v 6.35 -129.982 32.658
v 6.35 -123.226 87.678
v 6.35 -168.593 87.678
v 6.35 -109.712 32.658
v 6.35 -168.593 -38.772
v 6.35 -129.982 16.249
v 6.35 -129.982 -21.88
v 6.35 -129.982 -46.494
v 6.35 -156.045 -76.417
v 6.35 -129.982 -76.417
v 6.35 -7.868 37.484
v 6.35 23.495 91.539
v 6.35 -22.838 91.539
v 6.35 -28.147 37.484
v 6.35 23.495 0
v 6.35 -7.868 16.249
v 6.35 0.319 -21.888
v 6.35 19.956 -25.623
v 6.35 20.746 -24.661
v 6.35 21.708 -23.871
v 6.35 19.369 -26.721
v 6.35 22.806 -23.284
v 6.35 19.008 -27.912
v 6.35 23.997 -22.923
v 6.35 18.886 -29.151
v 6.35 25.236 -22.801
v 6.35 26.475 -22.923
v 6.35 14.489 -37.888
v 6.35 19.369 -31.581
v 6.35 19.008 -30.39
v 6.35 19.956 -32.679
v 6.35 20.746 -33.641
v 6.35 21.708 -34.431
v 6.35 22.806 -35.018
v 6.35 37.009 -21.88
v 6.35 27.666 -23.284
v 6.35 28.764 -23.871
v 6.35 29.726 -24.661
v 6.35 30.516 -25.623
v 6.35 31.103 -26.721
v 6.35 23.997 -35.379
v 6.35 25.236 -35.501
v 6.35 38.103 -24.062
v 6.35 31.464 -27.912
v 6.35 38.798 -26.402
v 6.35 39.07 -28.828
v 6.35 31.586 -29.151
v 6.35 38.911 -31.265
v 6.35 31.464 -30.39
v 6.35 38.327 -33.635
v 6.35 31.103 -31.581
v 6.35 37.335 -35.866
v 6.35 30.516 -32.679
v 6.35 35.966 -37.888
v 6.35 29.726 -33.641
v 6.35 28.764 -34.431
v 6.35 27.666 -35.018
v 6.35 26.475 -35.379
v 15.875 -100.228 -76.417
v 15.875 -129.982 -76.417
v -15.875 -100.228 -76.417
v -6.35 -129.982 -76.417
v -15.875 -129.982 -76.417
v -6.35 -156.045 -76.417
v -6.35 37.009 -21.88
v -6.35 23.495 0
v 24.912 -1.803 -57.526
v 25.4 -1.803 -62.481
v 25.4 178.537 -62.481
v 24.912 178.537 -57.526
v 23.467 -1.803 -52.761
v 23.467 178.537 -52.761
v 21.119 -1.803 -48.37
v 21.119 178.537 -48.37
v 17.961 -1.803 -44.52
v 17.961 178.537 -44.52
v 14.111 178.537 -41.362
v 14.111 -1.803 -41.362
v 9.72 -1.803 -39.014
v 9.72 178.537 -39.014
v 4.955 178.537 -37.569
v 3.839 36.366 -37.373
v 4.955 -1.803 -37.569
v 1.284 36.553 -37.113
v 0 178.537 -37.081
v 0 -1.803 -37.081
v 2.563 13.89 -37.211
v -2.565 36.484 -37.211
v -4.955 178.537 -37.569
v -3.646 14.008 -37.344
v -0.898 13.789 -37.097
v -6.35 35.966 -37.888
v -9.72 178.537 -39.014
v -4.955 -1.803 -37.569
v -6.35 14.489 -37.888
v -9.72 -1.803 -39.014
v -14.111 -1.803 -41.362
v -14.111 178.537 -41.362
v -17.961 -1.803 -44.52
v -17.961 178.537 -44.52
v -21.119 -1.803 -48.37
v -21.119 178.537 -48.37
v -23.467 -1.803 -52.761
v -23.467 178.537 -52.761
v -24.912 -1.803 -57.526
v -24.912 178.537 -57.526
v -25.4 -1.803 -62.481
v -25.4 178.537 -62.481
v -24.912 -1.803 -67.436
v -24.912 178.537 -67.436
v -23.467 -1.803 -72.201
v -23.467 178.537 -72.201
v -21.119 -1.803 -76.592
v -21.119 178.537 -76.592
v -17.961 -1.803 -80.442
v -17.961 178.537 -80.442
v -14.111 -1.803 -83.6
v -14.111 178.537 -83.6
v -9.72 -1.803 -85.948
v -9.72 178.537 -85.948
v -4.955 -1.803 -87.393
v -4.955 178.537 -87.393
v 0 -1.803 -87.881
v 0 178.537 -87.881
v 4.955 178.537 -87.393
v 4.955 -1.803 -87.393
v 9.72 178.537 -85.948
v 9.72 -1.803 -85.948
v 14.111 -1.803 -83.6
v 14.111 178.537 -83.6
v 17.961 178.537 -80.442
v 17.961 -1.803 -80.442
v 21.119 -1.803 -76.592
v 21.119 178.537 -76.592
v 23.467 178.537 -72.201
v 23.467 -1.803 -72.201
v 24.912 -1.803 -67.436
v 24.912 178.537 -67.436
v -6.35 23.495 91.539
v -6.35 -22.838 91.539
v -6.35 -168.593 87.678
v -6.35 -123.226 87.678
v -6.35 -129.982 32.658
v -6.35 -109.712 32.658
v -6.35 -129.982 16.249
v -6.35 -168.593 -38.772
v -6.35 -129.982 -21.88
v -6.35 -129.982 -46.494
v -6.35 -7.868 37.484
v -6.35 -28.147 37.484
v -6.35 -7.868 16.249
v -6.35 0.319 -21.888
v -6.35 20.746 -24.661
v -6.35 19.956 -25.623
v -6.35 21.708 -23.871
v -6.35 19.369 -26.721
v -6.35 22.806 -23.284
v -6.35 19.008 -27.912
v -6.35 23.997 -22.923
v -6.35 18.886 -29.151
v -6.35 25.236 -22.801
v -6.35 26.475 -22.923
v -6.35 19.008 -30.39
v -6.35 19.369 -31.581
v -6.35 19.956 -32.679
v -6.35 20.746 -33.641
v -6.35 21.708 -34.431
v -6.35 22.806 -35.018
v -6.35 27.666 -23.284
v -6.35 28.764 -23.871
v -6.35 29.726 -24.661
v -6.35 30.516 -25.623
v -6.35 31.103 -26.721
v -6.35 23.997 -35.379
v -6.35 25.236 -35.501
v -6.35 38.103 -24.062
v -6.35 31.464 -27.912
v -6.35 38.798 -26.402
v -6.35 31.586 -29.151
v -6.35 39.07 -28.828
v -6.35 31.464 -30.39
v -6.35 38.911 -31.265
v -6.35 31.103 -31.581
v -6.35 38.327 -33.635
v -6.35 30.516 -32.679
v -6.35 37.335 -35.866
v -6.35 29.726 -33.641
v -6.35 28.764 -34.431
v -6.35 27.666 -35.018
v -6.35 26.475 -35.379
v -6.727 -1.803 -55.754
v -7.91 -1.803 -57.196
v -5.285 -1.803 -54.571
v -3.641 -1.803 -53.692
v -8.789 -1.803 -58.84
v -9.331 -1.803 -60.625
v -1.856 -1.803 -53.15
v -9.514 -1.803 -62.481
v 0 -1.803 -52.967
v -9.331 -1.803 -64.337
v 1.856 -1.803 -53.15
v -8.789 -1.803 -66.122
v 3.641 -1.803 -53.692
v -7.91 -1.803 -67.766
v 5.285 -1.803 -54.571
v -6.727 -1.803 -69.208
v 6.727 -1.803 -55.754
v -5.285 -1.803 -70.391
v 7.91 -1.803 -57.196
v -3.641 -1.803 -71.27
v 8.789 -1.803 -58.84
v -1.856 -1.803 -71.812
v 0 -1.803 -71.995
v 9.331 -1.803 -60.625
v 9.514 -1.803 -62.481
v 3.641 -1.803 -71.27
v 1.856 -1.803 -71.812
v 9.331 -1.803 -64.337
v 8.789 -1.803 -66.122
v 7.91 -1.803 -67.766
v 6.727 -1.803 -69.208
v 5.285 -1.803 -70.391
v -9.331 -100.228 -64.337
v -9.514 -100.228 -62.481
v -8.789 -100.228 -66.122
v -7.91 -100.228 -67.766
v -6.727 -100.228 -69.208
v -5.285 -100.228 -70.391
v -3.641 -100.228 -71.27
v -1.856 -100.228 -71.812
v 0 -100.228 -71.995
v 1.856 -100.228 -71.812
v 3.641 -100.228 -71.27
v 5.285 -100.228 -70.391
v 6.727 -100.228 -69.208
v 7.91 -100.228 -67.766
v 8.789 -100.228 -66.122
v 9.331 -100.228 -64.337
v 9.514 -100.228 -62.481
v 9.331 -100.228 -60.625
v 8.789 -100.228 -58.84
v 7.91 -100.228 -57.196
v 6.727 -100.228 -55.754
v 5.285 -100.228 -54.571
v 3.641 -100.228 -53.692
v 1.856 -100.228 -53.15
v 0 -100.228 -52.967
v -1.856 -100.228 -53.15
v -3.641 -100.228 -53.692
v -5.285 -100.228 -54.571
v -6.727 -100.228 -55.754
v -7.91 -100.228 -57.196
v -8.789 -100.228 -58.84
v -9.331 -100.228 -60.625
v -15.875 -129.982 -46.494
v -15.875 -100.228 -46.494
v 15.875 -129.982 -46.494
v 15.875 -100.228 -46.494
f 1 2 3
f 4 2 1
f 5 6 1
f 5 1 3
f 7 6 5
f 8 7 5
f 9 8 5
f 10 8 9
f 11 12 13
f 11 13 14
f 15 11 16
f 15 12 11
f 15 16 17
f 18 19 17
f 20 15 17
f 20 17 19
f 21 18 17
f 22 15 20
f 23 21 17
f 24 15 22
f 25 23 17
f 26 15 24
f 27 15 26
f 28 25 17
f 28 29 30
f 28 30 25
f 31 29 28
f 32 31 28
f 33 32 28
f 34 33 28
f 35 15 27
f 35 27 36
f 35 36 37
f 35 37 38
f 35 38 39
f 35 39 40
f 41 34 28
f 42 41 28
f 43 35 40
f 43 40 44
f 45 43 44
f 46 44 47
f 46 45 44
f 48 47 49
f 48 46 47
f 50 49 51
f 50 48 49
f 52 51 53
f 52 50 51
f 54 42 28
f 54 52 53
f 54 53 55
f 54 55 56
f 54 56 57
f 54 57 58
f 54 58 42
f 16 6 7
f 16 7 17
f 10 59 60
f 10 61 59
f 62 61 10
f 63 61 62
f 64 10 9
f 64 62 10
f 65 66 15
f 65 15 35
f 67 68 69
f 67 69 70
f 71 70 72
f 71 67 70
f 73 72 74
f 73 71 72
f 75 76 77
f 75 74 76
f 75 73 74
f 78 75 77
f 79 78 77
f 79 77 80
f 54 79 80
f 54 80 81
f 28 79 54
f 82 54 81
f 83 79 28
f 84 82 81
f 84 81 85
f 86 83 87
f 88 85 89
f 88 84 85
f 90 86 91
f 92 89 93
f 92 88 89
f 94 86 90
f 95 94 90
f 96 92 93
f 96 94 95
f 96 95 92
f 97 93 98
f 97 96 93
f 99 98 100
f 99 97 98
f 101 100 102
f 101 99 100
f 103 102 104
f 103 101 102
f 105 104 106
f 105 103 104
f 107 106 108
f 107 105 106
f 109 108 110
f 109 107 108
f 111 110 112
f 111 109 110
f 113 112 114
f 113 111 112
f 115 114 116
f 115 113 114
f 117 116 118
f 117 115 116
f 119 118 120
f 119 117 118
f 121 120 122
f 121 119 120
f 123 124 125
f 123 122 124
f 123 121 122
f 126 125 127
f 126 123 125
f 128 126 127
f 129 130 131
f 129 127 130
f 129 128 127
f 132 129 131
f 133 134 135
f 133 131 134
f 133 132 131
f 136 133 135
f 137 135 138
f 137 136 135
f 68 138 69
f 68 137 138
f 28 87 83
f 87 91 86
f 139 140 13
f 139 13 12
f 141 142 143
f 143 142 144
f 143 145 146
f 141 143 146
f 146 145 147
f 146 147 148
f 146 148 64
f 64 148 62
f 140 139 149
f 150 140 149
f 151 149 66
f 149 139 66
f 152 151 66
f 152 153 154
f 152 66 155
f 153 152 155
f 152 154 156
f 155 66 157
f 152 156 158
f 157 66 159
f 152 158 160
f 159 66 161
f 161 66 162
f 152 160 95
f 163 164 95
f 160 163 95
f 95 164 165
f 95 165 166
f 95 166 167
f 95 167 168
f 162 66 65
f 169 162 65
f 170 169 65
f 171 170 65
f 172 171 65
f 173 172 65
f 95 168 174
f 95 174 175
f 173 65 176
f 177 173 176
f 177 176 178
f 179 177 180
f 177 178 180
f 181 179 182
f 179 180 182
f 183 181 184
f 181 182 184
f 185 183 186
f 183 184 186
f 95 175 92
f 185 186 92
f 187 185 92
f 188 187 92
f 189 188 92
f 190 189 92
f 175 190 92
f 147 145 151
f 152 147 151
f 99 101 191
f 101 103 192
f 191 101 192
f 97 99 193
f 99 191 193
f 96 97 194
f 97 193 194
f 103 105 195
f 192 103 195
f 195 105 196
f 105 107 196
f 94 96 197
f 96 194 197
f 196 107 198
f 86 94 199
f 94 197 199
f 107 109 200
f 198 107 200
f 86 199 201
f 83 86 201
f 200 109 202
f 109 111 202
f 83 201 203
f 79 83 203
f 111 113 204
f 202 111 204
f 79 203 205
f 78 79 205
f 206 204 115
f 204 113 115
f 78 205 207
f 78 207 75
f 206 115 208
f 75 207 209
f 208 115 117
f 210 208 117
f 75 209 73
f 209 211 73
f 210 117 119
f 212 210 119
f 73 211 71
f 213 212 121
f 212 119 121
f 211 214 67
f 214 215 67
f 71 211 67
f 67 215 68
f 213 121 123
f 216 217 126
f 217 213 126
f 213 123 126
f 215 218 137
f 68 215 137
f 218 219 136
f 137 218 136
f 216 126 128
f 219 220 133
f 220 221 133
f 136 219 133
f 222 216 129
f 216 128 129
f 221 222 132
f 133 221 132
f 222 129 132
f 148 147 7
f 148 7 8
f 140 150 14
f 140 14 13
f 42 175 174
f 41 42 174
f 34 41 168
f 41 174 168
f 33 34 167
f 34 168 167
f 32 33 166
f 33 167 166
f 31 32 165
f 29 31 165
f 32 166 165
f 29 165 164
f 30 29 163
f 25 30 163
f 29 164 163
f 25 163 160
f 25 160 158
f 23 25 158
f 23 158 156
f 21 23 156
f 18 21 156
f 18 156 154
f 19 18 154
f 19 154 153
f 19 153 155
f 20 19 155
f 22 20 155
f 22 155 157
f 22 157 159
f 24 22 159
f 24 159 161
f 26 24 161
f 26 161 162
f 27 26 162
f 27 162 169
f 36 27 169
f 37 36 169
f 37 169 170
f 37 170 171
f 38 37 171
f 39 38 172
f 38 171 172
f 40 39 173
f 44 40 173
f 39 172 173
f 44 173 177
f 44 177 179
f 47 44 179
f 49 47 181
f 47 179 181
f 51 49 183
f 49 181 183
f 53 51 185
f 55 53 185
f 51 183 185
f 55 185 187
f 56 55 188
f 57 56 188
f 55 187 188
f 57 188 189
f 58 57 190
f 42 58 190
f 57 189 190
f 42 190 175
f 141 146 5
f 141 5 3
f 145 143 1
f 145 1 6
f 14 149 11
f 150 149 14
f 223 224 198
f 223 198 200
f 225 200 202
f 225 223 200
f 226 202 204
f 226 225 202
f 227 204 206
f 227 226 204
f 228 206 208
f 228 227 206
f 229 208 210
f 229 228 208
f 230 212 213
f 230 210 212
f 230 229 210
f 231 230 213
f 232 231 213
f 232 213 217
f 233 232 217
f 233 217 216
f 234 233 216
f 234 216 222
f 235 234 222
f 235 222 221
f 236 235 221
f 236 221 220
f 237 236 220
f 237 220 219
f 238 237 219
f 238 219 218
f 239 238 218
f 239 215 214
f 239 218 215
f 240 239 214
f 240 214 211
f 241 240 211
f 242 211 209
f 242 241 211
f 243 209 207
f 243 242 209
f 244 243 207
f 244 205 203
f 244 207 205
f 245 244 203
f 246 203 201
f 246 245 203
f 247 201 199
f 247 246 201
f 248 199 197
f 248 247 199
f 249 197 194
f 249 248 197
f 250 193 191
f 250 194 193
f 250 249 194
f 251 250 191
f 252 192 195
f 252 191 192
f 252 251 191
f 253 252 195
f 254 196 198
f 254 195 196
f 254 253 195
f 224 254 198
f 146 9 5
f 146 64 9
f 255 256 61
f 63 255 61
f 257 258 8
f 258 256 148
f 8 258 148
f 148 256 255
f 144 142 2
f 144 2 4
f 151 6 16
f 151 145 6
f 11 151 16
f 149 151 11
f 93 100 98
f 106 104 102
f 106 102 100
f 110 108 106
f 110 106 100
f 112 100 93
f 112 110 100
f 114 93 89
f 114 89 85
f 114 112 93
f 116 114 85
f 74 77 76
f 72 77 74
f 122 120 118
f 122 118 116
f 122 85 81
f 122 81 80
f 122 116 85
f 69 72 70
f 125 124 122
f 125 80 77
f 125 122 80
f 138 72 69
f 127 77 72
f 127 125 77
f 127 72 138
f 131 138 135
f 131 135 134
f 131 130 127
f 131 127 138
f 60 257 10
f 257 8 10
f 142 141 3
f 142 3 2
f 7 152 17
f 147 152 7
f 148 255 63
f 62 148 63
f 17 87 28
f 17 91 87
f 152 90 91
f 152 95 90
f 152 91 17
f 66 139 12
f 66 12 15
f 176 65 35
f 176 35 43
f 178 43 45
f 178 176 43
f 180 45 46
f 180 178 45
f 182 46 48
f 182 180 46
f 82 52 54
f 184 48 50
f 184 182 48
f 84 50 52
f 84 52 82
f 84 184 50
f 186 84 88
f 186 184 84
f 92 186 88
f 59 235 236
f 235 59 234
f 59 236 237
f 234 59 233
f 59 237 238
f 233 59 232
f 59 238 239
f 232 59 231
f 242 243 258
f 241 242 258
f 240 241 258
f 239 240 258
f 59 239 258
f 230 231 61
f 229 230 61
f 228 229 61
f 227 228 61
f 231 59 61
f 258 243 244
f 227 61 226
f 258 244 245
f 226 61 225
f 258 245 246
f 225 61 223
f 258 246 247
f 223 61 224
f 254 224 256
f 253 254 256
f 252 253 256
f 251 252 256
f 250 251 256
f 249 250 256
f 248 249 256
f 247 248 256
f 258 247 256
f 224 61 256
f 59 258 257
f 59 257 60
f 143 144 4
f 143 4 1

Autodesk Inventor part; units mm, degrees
ref_plane "YZ Plane" through (0, 0, 0) normal (1, 0, 0) x (0, 1, 0)
ref_plane "XZ Plane" through (0, 0, 0) normal (0, 1, 0) x (-1, 0, 0)
ref_plane "XY Plane" through (0, 0, 0) normal (0, 0, 1) x (1, 0, 0)
sketch "Sketch1" plane through (0, 0, 0) normal (1, 0, 0) x (0, 0, -1)
  line L0 (76.417, -156.0446) -> (38.7716, -168.593)
  line L1 (38.7716, -168.593) -> (-87.6783, -168.593)
  line L2 (-87.6783, -168.593) -> (-87.6783, -123.2255)
  line L3 (-87.6783, -123.2255) -> (-32.6581, -109.7118)
  line L4 (-32.6581, -109.7118) -> (-32.6581, -129.9824)
  line L5 (-32.6581, -129.9824) -> (76.417, -129.9824)
  line L6 (76.417, -129.9824) -> (76.417, -156.0446)
  line L7 (-16.2486, -129.9824) -> (-16.2486, -7.8675)
  line L8 (-16.2486, -7.8675) -> (-37.4845, -7.8675)
  line L9 (-37.4845, -7.8675) -> (-37.4845, -28.1467)
  line L10 (-37.4845, -28.1467) -> (-91.5394, -22.8377)
  line L11 (-91.5394, -22.8377) -> (-91.5394, 23.4951)
  line L12 (-91.5394, 23.4951) -> (0, 23.4951)
  line L13 (0, 23.4951) -> (21.8795, 37.0088)
  arc A0 (38.3256, 14.8774) -> (21.8795, 37.0088) centre (29.1509, 25.2359) ccw
  line L14 (38.3256, 14.8774) -> (21.8883, 0.3187)
  line L15 (21.8883, 0.3187) -> (21.8795, -129.9824)
  line L16 (76.417, -129.9824) -> (76.417, -100.2282)
  line L17 (76.417, -100.2282) -> (46.4938, -100.2282)
  line L18 (46.4938, -100.2282) -> (46.4938, -129.9824)
  line L19 (46.4938, -129.9824) -> (76.417, -129.9824)
  point P0 (0, 0)
extrude "Extrusion1" add sketch "Sketch1" along normal mid plane 12.7 contours L0 L1 L2 L3 L4 L5 L6 | L5 L7 L8 L9 L10 L11 L12 L13 A0 L14 L15
extrude "Extrusion2" add sketch "Sketch1" along normal mid plane 31.75 contours L5 L18 L17 L16
sketch "Sketch2" plane through (15.875, -100.2282, -76.417) normal (0, 1, 0) x (-1, 0, 0)
  circle A0 centre (15.875, 13.936) radius 9.5136
  point P0 (15.875, 76.417)
extrude "Extrusion3" add sketch "Sketch2" along normal blind 98.425
sketch "Sketch3" plane through (0, -1.8032, -62.481) normal (0, 1, 0) x (1, 0, 0)
  circle A0 centre (0, 0) radius 25.4
  point P0 (0, -62.481)
  dimension "d6" = 50.8
extrude "Extrusion4" add sketch "Sketch3" along normal blind 180.34
sketch "Sketch4" plane through (6.35, 0, 0) normal (1, 0, 0) x (0, 0, -1)
  arc A0 (37.8876, 35.9665) -> (21.8795, 37.0088) centre (29.1509, 25.2359) ccw projected
  point P0 (0, 0)
  point P1 (22.8739, -26.7555)
hole "Hole1" at (6.35, 25.2359, -29.1509) direction (-1, 0, 0) diameter 12.7 end through all
properties part number "Sustitue Clamp"
